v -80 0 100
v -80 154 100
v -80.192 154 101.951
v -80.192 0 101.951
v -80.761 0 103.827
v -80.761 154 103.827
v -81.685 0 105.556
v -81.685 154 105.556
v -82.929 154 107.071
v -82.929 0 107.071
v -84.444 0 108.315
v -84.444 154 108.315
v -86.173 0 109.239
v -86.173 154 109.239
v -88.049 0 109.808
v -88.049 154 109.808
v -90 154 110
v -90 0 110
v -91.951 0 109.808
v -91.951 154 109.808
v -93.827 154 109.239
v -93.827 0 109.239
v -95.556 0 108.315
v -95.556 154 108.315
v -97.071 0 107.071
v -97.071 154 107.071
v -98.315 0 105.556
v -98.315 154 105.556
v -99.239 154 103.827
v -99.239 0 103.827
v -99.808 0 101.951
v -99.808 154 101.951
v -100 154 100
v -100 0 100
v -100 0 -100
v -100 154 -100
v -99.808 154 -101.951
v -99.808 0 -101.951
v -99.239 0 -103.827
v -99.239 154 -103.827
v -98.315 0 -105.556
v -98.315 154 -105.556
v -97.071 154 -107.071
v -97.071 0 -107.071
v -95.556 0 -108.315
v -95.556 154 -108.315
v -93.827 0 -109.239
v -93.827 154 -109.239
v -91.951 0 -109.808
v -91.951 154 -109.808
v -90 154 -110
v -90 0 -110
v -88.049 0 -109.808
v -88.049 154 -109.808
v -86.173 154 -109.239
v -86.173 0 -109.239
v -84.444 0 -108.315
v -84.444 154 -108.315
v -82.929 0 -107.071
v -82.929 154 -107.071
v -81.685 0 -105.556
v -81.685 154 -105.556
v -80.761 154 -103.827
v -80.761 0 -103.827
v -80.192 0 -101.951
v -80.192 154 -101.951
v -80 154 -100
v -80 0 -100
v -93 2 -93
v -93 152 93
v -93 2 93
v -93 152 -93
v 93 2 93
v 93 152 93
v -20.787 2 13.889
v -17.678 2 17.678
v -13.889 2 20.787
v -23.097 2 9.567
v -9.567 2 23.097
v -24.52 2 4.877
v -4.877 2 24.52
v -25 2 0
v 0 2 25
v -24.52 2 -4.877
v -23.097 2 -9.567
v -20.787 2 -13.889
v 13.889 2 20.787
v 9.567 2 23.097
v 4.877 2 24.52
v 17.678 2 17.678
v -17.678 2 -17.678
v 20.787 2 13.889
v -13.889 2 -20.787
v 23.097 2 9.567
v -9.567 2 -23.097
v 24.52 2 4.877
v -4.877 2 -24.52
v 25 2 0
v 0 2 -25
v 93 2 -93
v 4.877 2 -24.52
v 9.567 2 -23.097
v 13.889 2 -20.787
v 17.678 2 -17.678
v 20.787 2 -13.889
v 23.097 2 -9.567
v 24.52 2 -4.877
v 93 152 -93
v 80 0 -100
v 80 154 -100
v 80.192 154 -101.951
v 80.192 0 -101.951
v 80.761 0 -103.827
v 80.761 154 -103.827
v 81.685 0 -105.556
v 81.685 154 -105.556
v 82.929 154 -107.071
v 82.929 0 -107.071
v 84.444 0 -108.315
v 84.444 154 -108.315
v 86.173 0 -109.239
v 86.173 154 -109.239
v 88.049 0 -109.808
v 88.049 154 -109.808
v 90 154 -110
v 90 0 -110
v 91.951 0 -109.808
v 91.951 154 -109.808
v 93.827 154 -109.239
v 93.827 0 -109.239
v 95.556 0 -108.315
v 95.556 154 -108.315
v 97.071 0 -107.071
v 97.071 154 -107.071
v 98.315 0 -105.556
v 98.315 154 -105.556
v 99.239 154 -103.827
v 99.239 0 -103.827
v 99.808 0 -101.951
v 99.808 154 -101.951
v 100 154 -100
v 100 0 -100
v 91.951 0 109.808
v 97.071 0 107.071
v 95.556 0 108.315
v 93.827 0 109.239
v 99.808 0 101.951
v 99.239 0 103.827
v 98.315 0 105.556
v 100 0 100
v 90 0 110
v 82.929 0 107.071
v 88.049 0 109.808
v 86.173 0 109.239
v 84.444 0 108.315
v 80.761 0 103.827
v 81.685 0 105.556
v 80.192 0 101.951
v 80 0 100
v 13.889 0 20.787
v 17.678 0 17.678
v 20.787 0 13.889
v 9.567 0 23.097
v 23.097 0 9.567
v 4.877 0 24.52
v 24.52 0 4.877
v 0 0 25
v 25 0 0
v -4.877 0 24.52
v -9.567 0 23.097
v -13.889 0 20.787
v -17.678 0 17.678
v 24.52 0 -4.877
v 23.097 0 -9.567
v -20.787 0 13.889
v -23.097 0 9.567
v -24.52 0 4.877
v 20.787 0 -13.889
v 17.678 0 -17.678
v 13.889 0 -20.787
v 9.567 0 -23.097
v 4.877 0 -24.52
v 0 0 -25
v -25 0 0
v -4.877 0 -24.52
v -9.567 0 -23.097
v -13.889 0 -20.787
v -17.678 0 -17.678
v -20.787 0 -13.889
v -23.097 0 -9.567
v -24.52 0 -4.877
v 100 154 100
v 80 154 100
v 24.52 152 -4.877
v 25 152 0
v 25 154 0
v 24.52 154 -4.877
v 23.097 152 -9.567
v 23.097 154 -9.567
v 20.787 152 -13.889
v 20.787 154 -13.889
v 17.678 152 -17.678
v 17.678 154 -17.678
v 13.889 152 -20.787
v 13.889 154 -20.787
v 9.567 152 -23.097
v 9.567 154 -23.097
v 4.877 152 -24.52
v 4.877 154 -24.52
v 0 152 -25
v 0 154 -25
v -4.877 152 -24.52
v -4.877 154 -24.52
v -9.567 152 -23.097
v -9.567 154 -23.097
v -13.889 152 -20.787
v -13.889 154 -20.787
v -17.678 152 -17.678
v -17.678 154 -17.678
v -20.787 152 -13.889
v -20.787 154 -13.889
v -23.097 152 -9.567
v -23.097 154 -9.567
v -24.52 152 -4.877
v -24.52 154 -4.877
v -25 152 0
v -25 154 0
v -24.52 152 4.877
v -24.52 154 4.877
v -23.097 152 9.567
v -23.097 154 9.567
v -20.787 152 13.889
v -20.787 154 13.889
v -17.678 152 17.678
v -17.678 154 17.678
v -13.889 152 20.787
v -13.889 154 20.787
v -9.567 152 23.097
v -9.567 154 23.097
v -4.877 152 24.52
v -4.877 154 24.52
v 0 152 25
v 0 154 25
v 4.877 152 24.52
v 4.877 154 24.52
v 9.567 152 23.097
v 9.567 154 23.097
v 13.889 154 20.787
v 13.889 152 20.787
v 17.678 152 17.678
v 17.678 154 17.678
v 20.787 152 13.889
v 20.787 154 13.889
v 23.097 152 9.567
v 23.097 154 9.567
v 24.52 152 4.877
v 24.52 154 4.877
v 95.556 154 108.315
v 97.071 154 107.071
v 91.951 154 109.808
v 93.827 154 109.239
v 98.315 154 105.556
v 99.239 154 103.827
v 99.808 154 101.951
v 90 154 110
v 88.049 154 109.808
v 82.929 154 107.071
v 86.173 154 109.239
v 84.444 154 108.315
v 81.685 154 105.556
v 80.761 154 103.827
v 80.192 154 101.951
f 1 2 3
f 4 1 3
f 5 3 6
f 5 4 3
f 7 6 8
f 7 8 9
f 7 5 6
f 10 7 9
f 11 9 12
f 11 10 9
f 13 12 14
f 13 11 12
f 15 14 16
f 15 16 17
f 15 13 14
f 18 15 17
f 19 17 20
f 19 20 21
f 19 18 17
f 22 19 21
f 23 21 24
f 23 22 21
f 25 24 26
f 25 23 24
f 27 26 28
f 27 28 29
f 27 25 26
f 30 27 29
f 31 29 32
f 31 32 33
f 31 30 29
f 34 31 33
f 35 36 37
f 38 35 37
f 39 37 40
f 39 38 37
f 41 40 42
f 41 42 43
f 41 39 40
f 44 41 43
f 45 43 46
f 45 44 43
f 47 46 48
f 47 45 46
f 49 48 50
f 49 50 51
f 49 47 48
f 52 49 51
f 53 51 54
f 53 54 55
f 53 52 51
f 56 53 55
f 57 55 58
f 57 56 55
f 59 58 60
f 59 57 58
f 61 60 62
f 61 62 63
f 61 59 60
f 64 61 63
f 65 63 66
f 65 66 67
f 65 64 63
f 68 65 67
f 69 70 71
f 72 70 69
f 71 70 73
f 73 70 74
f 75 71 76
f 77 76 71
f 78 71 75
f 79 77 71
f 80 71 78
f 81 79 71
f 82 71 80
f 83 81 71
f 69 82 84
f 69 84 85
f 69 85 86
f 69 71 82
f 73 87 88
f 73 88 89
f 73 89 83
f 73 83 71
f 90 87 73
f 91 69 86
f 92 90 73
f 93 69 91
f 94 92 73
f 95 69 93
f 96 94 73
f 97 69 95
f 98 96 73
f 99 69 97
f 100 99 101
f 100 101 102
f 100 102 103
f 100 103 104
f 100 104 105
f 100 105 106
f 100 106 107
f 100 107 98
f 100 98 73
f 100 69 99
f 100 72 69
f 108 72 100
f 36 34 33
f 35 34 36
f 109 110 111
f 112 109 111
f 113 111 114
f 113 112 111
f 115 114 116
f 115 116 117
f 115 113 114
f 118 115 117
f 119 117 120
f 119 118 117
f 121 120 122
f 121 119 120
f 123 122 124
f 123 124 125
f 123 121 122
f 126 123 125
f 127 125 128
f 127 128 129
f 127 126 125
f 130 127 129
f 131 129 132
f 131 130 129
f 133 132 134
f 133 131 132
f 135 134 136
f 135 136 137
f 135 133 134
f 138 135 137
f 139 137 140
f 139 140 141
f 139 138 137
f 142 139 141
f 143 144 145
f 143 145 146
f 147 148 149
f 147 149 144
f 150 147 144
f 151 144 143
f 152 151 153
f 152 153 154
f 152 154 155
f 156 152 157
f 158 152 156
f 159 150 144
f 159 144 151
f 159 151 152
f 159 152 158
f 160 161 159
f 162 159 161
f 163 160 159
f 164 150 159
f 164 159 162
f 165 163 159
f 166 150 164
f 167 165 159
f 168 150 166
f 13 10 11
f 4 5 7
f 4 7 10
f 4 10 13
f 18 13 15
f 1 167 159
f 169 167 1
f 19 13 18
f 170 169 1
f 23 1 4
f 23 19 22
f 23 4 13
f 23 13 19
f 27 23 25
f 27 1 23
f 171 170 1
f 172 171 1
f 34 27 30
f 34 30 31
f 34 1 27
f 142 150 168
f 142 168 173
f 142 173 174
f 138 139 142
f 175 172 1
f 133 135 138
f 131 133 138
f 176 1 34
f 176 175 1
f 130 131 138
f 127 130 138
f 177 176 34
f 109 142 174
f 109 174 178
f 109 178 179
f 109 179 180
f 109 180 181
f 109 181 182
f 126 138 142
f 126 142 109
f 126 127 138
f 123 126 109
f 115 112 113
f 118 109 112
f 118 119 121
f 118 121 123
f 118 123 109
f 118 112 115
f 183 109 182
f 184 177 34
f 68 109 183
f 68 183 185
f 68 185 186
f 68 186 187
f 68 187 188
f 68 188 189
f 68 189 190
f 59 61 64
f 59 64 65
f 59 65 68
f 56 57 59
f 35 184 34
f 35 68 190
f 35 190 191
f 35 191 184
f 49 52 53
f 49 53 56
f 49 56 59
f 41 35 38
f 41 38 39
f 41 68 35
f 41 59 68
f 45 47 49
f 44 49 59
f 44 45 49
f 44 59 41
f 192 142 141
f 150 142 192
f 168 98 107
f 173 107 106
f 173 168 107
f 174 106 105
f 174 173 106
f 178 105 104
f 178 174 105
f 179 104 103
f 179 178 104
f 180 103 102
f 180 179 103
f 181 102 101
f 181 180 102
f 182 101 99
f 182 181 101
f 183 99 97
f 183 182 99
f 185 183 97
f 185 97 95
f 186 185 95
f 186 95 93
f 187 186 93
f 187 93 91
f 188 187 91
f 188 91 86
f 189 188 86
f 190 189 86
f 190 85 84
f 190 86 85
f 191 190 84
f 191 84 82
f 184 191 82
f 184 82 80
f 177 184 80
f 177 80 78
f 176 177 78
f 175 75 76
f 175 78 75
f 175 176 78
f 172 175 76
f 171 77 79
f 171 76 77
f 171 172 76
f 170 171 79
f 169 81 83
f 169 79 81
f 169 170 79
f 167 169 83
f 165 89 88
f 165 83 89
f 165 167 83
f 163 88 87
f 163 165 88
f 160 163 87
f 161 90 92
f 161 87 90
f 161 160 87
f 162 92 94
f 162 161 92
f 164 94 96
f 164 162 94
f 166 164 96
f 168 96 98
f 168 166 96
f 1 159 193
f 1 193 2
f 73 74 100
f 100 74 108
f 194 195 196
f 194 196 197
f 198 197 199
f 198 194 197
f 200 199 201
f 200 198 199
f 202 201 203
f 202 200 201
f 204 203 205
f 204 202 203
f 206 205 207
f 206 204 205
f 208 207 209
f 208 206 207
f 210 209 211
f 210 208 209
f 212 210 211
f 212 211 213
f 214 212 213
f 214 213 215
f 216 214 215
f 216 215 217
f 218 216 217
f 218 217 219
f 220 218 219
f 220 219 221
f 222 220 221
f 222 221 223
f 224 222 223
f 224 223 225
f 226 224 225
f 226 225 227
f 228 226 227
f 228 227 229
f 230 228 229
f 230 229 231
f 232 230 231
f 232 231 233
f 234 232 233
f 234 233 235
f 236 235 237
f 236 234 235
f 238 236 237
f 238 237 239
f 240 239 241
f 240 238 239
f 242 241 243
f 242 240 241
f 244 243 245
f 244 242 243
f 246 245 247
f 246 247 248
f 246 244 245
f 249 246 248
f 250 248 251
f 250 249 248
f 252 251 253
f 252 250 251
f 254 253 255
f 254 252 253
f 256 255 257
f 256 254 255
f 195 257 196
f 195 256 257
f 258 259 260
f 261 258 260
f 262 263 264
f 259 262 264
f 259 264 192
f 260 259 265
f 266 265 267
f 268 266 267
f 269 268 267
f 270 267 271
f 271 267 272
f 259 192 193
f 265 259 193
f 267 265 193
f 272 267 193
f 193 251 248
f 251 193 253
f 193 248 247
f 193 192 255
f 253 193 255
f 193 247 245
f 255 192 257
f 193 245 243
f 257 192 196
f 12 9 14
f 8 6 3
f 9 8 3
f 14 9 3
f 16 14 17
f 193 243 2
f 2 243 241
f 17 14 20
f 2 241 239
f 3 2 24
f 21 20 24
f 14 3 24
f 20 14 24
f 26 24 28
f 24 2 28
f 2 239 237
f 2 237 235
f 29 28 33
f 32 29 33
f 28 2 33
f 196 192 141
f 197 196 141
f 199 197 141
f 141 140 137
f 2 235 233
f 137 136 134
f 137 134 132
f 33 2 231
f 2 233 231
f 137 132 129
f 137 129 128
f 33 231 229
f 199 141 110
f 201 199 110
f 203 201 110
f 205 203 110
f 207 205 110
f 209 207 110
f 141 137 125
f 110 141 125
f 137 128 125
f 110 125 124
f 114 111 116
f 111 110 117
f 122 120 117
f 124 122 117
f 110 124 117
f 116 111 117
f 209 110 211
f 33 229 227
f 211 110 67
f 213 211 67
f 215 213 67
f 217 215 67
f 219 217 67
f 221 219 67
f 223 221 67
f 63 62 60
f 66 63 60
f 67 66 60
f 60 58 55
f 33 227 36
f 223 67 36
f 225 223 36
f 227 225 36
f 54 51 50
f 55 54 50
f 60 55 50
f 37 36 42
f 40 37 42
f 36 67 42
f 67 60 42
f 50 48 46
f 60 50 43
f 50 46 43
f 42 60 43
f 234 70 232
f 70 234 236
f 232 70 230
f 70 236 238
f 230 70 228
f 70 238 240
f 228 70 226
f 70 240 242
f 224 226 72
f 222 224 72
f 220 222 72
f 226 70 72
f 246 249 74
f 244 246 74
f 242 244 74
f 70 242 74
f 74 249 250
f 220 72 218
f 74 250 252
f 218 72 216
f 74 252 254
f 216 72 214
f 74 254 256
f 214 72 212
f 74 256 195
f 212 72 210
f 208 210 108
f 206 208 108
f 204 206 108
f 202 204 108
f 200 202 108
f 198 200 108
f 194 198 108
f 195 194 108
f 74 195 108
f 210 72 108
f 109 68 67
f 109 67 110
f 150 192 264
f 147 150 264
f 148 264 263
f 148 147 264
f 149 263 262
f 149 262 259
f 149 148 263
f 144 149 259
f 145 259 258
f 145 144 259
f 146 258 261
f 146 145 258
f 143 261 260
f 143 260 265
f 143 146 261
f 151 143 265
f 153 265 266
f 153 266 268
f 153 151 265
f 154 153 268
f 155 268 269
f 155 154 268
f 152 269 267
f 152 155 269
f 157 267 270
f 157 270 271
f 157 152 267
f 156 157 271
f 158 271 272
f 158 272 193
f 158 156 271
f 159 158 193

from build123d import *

# Parameters (mm, degrees)
SKETCH1_R           = 25
BOSS_EXTRUDE1_DEPTH = 154
SKETCH2_W           = 186
SKETCH2_H           = 186
CUT_EXTRUDE1_DEPTH  = 150


with BuildPart() as part:
    # Sketch1 → Boss-Extrude1 (new body)
    with BuildSketch(Plane(origin=(0, 0, 0), x_dir=(1, 0, 0), z_dir=(0, 1, 0))):
        with BuildLine():
            Line((-80, 100), (80, 100))
            ThreePointArc((80, 100), (90, 110), (100, 100))
            Line((100, 100), (100, -100))
            ThreePointArc((100, -100), (90, -110), (80, -100))
            Line((80, -100), (-80, -100))
            ThreePointArc((-80, -100), (-90, -110), (-100, -100))
            Line((-100, -100), (-100, 100))
            ThreePointArc((-100, 100), (-90, 110), (-80, 100))
        make_face()
        Circle(SKETCH1_R, mode=Mode.SUBTRACT)
    extrude(amount=BOSS_EXTRUDE1_DEPTH)

    # Sketch2 → Cut-Extrude1 (cut)
    with BuildSketch(Plane(origin=(0, 152, 0), x_dir=(1, 0, 0), z_dir=(0, 1, 0))):
        Rectangle(SKETCH2_W, SKETCH2_H)
    extrude(amount=-CUT_EXTRUDE1_DEPTH, mode=Mode.SUBTRACT)


solid = part.part
